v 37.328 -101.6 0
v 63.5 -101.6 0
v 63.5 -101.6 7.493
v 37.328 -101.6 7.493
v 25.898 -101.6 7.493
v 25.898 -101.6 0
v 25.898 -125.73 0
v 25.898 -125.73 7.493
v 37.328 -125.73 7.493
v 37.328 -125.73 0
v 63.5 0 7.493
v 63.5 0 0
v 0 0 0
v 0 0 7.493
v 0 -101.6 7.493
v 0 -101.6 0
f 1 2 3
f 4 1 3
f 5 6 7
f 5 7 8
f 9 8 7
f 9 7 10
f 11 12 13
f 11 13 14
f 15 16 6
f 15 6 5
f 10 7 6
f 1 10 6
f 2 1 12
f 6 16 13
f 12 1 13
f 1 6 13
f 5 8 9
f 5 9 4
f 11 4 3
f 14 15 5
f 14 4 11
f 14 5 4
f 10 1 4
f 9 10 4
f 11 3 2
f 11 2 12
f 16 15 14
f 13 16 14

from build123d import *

# Parameters (mm, degrees)
F0_W     = 101.6
F0_H     = 7.493
F1_DEPTH = 63.5
F3_W     = 11.43
F3_H     = 7.493
F4_DEPTH = 24.13


with BuildPart() as f1:
    # F0 (on Right) → F1 (new body)
    with BuildSketch(Plane.YZ):
        with Locations((-50.8, 3.7465)):
            Rectangle(F0_W, F0_H)
    extrude(amount=F1_DEPTH)

    # F3 (on face) → F4 (join)
    with BuildSketch(Plane.XZ.offset(101.6)):
        with Locations((31.613354, 3.7465)):
            Rectangle(F3_W, F3_H)
    extrude(amount=F4_DEPTH)


solid = f1.part
